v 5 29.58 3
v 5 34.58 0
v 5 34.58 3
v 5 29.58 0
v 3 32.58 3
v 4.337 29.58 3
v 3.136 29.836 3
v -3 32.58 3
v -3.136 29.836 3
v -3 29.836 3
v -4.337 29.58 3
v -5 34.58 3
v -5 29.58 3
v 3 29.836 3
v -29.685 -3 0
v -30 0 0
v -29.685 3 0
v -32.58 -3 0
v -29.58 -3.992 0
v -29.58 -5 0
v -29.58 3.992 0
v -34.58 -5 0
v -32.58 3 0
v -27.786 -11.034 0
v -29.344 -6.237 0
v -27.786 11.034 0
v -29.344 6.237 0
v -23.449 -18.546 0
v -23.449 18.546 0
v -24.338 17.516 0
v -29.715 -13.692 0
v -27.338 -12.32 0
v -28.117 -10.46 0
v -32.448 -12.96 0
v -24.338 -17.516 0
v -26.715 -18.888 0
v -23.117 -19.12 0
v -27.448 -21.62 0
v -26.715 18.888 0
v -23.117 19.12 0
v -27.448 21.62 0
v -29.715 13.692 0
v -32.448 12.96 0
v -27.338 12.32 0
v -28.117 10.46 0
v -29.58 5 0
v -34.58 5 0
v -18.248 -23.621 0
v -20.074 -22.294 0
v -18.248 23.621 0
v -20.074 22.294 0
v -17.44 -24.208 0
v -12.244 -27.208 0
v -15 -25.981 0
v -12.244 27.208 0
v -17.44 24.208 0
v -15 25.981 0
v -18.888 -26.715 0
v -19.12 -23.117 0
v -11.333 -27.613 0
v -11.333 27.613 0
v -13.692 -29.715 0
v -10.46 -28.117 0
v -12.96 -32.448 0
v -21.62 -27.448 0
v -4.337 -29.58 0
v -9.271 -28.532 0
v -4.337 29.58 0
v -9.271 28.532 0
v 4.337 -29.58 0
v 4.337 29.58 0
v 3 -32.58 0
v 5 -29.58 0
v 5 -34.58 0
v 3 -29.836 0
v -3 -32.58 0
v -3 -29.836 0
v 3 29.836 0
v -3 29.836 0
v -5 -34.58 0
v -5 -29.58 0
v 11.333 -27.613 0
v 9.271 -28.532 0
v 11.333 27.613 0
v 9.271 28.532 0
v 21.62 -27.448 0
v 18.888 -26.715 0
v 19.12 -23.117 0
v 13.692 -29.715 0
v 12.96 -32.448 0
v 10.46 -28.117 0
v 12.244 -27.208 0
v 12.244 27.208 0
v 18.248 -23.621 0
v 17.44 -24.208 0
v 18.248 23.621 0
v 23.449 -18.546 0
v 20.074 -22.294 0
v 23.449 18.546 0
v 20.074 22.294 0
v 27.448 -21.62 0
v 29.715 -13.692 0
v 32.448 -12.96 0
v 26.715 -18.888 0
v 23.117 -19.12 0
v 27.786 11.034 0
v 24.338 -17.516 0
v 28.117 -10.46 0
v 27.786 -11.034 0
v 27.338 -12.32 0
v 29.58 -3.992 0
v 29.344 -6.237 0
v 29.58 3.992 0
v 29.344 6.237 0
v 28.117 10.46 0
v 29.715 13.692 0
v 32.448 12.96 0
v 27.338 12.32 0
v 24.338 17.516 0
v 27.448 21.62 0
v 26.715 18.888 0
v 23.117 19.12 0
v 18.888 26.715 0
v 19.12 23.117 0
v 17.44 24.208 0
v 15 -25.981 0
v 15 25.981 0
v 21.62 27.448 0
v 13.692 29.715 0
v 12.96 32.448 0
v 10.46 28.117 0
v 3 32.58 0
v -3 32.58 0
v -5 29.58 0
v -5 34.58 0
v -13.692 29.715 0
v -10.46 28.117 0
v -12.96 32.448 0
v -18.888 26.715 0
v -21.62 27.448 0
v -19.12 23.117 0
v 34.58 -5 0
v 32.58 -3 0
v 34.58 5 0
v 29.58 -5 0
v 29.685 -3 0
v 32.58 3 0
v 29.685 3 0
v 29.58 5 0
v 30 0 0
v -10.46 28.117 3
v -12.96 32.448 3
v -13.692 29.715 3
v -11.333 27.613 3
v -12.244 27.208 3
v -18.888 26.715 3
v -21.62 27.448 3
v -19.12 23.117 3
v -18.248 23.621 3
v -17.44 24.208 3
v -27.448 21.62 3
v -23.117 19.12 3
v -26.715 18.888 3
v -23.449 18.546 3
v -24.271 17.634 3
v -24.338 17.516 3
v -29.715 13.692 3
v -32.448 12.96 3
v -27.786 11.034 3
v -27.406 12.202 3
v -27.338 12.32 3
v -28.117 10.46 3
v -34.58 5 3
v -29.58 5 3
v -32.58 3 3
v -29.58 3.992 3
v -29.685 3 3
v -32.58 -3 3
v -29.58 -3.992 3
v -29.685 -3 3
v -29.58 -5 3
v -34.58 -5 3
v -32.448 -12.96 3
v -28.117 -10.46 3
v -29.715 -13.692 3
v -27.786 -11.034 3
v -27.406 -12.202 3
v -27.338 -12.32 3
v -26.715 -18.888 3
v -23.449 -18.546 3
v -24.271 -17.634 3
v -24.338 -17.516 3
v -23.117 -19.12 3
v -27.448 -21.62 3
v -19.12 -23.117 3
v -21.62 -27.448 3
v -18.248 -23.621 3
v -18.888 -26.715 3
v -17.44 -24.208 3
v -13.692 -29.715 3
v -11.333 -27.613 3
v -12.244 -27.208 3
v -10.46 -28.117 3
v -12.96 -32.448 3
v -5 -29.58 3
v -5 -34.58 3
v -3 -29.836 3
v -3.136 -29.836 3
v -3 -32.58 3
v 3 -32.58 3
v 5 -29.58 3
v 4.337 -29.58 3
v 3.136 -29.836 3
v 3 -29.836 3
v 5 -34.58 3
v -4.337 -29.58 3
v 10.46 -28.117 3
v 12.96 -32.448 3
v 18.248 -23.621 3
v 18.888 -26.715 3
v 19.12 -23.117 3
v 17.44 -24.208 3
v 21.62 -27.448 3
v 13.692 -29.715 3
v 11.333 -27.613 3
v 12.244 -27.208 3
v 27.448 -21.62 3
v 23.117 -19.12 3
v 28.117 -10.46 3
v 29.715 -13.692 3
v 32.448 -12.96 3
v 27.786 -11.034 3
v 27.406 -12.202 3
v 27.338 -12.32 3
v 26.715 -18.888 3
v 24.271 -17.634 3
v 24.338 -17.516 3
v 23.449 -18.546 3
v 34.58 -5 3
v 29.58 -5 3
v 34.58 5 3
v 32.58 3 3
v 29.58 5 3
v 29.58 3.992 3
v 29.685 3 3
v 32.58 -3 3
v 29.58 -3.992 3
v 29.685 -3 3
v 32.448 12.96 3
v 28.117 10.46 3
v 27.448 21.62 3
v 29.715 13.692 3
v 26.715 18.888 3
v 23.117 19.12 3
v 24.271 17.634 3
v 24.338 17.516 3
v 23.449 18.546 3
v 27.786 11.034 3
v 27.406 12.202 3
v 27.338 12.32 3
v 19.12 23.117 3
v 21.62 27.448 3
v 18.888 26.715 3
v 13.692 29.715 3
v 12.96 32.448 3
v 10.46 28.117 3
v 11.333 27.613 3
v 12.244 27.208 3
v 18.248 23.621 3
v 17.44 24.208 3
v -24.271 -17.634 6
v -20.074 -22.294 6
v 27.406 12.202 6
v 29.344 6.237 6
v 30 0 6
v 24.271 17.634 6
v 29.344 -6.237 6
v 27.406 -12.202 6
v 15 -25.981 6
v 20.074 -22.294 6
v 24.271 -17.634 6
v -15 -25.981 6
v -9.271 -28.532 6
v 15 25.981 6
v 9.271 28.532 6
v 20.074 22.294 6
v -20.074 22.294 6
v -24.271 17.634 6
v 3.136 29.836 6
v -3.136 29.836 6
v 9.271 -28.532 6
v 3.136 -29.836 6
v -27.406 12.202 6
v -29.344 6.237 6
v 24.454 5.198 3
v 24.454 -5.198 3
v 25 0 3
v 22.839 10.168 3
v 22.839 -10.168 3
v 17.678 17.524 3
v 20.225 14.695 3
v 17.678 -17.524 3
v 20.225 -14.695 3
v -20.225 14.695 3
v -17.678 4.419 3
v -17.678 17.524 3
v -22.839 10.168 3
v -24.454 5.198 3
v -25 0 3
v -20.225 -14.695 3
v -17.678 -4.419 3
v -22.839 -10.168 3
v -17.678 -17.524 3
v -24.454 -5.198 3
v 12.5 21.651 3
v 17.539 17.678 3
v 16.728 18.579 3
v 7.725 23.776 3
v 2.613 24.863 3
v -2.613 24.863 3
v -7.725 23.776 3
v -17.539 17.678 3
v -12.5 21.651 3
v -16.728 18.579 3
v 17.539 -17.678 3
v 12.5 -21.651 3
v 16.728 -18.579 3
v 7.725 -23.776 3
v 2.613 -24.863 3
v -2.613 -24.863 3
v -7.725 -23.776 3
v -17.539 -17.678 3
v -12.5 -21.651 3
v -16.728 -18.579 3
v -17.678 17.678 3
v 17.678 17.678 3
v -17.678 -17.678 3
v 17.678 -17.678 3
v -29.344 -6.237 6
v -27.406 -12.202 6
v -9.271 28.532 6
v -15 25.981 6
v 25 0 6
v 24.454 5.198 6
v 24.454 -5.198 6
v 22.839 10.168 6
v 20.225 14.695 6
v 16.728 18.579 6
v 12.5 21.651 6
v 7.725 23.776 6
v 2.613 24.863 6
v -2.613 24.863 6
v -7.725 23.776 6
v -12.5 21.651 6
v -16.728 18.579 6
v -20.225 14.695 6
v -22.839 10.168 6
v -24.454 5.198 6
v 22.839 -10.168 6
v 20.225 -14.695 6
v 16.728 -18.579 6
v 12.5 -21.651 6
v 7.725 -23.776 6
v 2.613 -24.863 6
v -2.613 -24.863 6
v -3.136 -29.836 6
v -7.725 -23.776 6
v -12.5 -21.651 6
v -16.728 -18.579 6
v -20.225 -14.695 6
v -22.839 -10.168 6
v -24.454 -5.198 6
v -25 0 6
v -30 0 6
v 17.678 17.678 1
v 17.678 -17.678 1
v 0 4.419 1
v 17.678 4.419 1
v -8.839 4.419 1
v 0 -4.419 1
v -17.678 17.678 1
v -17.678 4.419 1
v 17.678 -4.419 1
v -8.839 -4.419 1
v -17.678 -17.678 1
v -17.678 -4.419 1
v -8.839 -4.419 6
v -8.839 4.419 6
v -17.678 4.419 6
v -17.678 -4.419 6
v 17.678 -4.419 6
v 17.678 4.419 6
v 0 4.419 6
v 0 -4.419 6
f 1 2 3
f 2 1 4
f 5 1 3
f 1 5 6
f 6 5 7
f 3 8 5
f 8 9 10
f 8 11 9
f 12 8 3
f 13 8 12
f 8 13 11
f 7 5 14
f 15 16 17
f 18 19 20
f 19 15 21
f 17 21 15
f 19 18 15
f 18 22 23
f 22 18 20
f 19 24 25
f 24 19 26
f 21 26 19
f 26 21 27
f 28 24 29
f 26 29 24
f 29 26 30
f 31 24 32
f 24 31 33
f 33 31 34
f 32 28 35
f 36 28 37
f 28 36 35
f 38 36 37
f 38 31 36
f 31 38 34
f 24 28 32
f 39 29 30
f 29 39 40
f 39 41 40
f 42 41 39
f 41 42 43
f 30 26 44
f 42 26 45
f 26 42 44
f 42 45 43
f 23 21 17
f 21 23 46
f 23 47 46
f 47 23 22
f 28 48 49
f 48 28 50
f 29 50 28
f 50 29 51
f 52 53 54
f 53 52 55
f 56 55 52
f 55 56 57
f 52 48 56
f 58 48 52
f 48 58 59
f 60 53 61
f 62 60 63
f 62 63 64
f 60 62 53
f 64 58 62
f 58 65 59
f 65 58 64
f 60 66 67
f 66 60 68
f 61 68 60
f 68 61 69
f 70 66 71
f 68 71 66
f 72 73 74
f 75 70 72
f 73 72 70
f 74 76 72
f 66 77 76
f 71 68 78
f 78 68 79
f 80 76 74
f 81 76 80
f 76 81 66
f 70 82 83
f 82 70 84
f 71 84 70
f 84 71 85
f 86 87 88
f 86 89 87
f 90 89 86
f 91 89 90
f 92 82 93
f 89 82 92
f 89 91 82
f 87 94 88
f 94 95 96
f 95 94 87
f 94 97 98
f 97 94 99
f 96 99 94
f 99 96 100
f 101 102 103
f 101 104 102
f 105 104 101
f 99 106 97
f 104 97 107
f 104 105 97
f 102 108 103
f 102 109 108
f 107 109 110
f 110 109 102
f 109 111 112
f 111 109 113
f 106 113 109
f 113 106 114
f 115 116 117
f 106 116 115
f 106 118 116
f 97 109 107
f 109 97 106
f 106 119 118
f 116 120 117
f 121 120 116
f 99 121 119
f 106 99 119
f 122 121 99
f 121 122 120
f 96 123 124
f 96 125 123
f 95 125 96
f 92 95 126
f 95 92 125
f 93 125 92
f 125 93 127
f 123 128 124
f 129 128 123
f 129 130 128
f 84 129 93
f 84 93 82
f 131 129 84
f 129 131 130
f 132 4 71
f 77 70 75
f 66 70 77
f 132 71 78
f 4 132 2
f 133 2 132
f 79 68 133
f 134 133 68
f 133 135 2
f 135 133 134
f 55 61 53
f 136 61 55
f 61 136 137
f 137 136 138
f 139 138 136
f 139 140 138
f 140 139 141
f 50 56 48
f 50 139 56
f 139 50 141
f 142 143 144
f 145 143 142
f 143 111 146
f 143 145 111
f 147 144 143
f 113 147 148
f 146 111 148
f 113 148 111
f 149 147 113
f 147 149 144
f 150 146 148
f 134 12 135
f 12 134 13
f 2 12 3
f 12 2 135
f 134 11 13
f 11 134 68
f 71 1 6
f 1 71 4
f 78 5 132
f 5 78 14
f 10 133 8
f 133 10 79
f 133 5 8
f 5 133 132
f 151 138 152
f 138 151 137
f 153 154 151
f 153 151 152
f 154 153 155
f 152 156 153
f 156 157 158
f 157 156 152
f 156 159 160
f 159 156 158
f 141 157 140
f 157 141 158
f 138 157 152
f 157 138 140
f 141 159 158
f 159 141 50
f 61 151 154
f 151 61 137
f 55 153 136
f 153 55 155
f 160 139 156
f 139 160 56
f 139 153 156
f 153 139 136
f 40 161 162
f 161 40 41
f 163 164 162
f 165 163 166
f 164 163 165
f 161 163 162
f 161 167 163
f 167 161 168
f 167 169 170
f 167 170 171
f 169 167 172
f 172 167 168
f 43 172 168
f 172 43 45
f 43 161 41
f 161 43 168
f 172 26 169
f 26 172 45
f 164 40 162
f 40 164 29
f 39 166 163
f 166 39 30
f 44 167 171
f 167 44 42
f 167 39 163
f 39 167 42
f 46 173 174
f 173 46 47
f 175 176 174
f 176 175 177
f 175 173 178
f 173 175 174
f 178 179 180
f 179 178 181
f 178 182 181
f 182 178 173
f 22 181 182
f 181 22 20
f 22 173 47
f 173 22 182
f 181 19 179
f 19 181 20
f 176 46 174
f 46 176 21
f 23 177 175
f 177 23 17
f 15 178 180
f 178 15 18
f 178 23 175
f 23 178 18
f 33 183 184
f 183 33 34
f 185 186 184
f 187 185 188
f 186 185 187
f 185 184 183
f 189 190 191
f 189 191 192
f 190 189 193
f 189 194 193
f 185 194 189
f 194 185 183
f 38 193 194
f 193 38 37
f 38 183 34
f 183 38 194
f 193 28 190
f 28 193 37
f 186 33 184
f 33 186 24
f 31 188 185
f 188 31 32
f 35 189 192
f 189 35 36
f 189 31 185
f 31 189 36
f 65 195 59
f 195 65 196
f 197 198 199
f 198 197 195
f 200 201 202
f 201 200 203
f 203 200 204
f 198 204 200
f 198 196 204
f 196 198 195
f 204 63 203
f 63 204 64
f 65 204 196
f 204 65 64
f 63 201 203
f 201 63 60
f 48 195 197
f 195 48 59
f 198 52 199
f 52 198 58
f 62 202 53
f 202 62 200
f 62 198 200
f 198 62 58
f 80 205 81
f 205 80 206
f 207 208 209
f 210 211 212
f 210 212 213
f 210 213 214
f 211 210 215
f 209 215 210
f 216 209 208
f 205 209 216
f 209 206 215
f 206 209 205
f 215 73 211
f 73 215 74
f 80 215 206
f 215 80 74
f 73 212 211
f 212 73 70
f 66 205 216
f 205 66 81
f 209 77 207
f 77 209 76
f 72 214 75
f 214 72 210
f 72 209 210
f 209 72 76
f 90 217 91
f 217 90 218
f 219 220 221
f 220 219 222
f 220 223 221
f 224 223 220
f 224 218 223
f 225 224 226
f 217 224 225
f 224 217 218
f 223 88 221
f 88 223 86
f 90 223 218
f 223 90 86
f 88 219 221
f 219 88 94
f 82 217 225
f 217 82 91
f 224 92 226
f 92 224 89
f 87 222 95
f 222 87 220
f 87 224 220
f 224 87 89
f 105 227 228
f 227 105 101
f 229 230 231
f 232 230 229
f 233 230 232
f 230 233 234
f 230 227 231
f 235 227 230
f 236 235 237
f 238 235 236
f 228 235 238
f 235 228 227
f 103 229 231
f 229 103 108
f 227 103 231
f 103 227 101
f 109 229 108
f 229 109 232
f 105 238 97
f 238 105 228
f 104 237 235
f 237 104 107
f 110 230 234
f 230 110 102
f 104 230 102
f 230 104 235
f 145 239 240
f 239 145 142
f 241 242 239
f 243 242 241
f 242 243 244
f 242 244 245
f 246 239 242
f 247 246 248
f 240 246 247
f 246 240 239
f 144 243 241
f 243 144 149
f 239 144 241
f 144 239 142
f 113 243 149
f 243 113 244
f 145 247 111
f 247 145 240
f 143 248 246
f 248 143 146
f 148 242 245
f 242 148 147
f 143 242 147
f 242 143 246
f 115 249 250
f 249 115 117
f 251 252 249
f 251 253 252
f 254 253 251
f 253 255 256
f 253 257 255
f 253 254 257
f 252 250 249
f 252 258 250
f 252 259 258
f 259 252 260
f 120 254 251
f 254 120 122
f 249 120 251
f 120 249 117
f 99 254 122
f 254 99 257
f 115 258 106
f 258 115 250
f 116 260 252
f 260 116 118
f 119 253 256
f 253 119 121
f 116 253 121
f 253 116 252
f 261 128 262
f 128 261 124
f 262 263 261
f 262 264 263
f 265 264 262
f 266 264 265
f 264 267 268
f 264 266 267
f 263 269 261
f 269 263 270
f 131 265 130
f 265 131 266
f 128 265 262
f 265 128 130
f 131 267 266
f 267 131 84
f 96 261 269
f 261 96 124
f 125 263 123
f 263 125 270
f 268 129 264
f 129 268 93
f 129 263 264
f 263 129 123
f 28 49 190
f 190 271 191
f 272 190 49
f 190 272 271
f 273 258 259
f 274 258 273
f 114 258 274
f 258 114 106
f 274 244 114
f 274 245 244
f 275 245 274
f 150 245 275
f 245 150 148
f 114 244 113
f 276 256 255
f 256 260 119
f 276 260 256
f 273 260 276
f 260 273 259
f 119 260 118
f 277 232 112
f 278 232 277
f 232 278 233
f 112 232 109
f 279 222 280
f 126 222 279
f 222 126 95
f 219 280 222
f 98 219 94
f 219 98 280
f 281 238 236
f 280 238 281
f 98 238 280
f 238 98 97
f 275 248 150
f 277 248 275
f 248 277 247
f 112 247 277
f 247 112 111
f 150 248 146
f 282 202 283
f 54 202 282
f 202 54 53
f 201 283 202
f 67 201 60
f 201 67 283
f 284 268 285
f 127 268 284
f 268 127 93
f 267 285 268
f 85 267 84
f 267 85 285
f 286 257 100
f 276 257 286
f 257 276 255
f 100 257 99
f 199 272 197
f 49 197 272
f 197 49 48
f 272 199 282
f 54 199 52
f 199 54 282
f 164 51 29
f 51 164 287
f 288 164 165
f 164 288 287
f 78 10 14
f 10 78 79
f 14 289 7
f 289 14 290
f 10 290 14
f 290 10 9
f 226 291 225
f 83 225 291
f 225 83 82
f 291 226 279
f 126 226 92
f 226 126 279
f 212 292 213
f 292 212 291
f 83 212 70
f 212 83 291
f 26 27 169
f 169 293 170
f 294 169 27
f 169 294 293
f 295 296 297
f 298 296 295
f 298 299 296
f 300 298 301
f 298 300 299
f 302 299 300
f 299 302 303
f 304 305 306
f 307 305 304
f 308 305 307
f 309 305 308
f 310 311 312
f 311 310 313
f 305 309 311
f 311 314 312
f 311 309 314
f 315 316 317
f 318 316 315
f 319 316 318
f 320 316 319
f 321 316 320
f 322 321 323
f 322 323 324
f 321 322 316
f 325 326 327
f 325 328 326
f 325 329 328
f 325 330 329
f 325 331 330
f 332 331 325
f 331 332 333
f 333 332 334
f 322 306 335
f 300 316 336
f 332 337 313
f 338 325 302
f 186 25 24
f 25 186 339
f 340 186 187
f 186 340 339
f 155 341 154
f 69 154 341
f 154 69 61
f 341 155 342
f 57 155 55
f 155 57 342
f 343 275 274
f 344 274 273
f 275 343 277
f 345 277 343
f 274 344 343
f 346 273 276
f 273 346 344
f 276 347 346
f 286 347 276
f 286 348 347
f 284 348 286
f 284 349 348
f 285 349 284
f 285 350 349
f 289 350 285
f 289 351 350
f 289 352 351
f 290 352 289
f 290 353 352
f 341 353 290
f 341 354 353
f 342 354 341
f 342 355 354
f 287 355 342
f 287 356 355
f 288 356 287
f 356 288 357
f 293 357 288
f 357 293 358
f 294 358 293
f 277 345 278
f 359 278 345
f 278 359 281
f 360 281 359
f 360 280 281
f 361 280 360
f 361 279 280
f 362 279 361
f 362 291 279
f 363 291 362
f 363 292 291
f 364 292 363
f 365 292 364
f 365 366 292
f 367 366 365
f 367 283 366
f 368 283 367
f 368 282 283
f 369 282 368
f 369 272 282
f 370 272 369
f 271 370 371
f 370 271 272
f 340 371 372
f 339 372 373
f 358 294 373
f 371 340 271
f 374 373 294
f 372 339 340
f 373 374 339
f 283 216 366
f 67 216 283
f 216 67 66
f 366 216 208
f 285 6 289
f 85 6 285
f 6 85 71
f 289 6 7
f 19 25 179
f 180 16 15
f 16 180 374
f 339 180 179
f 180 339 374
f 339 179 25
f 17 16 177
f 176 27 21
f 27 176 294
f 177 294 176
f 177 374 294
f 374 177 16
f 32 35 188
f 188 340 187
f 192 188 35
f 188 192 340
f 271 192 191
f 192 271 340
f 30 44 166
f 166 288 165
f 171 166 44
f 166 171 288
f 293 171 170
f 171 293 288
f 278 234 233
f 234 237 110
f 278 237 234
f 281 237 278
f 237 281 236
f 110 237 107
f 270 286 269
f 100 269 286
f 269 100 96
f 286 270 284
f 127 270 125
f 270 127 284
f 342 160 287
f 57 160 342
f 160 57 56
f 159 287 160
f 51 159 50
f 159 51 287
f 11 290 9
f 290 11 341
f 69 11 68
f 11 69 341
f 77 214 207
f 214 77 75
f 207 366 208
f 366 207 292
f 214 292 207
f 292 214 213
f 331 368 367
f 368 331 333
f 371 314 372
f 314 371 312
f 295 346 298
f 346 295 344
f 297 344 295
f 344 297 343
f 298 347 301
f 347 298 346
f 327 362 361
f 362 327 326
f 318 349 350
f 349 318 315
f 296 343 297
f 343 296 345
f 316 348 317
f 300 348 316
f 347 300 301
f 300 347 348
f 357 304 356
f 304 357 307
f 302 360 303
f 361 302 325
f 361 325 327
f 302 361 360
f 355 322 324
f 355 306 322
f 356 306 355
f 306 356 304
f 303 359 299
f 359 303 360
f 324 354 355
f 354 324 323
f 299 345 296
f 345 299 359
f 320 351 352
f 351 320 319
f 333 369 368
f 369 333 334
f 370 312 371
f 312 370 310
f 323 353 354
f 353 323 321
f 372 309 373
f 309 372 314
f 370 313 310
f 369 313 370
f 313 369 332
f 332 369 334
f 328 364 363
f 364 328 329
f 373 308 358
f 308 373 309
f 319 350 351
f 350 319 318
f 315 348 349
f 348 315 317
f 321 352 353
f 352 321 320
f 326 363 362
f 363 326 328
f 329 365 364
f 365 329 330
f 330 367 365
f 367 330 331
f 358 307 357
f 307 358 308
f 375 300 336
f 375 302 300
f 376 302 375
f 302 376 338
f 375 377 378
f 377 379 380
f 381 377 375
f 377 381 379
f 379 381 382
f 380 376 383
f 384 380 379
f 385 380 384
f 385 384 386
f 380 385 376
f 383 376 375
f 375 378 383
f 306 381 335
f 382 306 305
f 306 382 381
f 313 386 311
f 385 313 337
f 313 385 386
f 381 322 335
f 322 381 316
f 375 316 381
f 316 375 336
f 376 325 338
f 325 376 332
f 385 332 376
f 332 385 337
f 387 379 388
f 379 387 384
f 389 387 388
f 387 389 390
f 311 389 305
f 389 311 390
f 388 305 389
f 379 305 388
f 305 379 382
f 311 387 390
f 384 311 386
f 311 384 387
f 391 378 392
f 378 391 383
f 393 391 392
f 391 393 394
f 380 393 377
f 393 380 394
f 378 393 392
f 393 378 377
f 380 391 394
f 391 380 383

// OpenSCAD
union() {
	difference() {
		union() {
			union() {
				union() {
					union() {
						union() {
							union() {
								union() {
									union() {
										union() {
											union() {
												union() {
													union() {
														translate(v = [0, 29.5803989155, 0]) {
															translate(v = [-5.0000000000, 0, 0]) {
																difference() {
																	cube(size = [10, 5, 3]);
																	translate(v = [2.0000000000, 0, 0]) {
																		cube(size = [6, 3, 10]);
																	}
																}
															}
														}
														rotate(a = [0, 0, 30.0000000000]) {
															translate(v = [0, 29.5803989155, 0]) {
																translate(v = [-5.0000000000, 0, 0]) {
																	difference() {
																		cube(size = [10, 5, 3]);
																		translate(v = [2.0000000000, 0, 0]) {
																			cube(size = [6, 3, 10]);
																		}
																	}
																}
															}
														}
													}
													rotate(a = [0, 0, 60.0000000000]) {
														translate(v = [0, 29.5803989155, 0]) {
															translate(v = [-5.0000000000, 0, 0]) {
																difference() {
																	cube(size = [10, 5, 3]);
																	translate(v = [2.0000000000, 0, 0]) {
																		cube(size = [6, 3, 10]);
																	}
																}
															}
														}
													}
												}
												rotate(a = [0, 0, 90.0000000000]) {
													translate(v = [0, 29.5803989155, 0]) {
														translate(v = [-5.0000000000, 0, 0]) {
															difference() {
																cube(size = [10, 5, 3]);
																translate(v = [2.0000000000, 0, 0]) {
																	cube(size = [6, 3, 10]);
																}
															}
														}
													}
												}
											}
											rotate(a = [0, 0, 120.0000000000]) {
												translate(v = [0, 29.5803989155, 0]) {
													translate(v = [-5.0000000000, 0, 0]) {
														difference() {
															cube(size = [10, 5, 3]);
															translate(v = [2.0000000000, 0, 0]) {
																cube(size = [6, 3, 10]);
															}
														}
													}
												}
											}
										}
										rotate(a = [0, 0, 150.0000000000]) {
											translate(v = [0, 29.5803989155, 0]) {
												translate(v = [-5.0000000000, 0, 0]) {
													difference() {
														cube(size = [10, 5, 3]);
														translate(v = [2.0000000000, 0, 0]) {
															cube(size = [6, 3, 10]);
														}
													}
												}
											}
										}
									}
									rotate(a = [0, 0, 180.0000000000]) {
										translate(v = [0, 29.5803989155, 0]) {
											translate(v = [-5.0000000000, 0, 0]) {
												difference() {
													cube(size = [10, 5, 3]);
													translate(v = [2.0000000000, 0, 0]) {
														cube(size = [6, 3, 10]);
													}
												}
											}
										}
									}
								}
								rotate(a = [0, 0, 210.0000000000]) {
									translate(v = [0, 29.5803989155, 0]) {
										translate(v = [-5.0000000000, 0, 0]) {
											difference() {
												cube(size = [10, 5, 3]);
												translate(v = [2.0000000000, 0, 0]) {
													cube(size = [6, 3, 10]);
												}
											}
										}
									}
								}
							}
							rotate(a = [0, 0, 240.0000000000]) {
								translate(v = [0, 29.5803989155, 0]) {
									translate(v = [-5.0000000000, 0, 0]) {
										difference() {
											cube(size = [10, 5, 3]);
											translate(v = [2.0000000000, 0, 0]) {
												cube(size = [6, 3, 10]);
											}
										}
									}
								}
							}
						}
						rotate(a = [0, 0, 270.0000000000]) {
							translate(v = [0, 29.5803989155, 0]) {
								translate(v = [-5.0000000000, 0, 0]) {
									difference() {
										cube(size = [10, 5, 3]);
										translate(v = [2.0000000000, 0, 0]) {
											cube(size = [6, 3, 10]);
										}
									}
								}
							}
						}
					}
					rotate(a = [0, 0, 300.0000000000]) {
						translate(v = [0, 29.5803989155, 0]) {
							translate(v = [-5.0000000000, 0, 0]) {
								difference() {
									cube(size = [10, 5, 3]);
									translate(v = [2.0000000000, 0, 0]) {
										cube(size = [6, 3, 10]);
									}
								}
							}
						}
					}
				}
				rotate(a = [0, 0, 330.0000000000]) {
					translate(v = [0, 29.5803989155, 0]) {
						translate(v = [-5.0000000000, 0, 0]) {
							difference() {
								cube(size = [10, 5, 3]);
								translate(v = [2.0000000000, 0, 0]) {
									cube(size = [6, 3, 10]);
								}
							}
						}
					}
				}
			}
			union() {
				cylinder(h = 3, r = 30);
				translate(v = [0, 0, 3]) {
					difference() {
						cylinder(h = 3, r = 30);
						cylinder(h = 3, r = 25);
					}
				}
			}
		}
		translate(v = [0, 0, 2.0000000000]) {
			cube(center = true, size = [35.3553390593, 35.3553390593, 2]);
		}
	}
	translate(v = [-17.6776695297, -4.4194173824, 0]) {
		union() {
			cube(size = [8.8388347648, 8.8388347648, 6]);
			translate(v = [17.6776695297, 0, 0]) {
				cube(size = [17.6776695297, 8.8388347648, 6]);
			}
		}
	}
}
